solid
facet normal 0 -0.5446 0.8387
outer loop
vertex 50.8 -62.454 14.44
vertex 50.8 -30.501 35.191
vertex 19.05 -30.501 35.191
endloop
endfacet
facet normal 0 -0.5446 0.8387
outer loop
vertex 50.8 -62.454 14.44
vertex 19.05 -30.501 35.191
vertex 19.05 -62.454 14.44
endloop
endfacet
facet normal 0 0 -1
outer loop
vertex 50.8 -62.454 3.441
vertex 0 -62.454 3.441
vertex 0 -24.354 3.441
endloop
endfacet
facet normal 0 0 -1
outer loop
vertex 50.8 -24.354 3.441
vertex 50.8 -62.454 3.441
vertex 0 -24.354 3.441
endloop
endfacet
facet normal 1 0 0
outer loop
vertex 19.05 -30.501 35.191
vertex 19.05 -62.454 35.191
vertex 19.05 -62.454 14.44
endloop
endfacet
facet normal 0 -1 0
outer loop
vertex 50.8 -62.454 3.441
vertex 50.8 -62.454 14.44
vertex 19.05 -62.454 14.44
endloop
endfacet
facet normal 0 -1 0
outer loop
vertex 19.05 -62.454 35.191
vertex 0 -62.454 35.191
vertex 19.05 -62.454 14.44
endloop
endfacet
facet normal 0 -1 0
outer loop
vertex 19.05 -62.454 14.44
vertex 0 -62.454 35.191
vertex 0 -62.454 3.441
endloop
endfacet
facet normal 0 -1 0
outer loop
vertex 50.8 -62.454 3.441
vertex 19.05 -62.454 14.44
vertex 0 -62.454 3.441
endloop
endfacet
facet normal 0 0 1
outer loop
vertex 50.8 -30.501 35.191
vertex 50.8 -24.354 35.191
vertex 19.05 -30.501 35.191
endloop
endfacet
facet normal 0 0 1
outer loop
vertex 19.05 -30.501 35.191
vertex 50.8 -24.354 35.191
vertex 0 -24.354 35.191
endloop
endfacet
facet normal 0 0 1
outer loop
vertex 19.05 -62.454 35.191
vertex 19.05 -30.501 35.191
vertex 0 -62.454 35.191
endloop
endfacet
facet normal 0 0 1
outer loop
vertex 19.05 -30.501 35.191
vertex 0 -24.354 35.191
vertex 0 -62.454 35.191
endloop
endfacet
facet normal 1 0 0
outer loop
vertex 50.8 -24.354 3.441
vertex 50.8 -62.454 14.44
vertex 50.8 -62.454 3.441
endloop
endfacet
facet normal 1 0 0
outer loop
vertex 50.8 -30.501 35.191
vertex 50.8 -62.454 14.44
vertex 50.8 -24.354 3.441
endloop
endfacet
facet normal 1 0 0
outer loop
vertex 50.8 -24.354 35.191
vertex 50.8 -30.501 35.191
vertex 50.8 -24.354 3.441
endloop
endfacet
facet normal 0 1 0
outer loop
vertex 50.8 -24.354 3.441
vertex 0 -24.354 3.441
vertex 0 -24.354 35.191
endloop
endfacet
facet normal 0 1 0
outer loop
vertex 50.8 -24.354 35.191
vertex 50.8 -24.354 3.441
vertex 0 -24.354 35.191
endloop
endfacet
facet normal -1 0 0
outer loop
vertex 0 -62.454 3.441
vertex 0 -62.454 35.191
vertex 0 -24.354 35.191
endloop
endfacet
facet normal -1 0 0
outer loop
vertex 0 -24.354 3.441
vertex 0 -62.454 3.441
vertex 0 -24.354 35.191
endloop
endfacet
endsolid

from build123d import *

# Parameters (mm, degrees)
F0_W     = 38.1
F0_H     = 31.75
F1_DEPTH = 25.4
F3_DEPTH = 25.4
F4_DEPTH = 6.35


with BuildPart() as f1:
    # F0 (on Right) → F1 (new body)
    with BuildSketch(Plane.YZ):
        with Locations((-43.4044748545, 19.3160282822)):
            Rectangle(F0_W, F0_H)
    extrude(amount=F1_DEPTH)

    # F2 (on face) → F3 (join)
    with BuildSketch(Plane.YZ.offset(25.4)):
        Polygon((-24.3544748545, 35.1910282822), (-30.5013419502, 35.1910282822), (-62.4544748545, 14.43994885), (-62.4544748545, 3.4410282822), (-24.3544748545, 3.4410282822), align=None)
    extrude(amount=F3_DEPTH)

    # F4 (cut): a face of the model
    f4_faces = [f1.faces().sort_by_distance(p)[0] for p in [
        (25.4, -51.8034305531, 28.2740018048),
    ]]
    extrude(f4_faces, amount=-F4_DEPTH, mode=Mode.SUBTRACT)


solid = f1.part
